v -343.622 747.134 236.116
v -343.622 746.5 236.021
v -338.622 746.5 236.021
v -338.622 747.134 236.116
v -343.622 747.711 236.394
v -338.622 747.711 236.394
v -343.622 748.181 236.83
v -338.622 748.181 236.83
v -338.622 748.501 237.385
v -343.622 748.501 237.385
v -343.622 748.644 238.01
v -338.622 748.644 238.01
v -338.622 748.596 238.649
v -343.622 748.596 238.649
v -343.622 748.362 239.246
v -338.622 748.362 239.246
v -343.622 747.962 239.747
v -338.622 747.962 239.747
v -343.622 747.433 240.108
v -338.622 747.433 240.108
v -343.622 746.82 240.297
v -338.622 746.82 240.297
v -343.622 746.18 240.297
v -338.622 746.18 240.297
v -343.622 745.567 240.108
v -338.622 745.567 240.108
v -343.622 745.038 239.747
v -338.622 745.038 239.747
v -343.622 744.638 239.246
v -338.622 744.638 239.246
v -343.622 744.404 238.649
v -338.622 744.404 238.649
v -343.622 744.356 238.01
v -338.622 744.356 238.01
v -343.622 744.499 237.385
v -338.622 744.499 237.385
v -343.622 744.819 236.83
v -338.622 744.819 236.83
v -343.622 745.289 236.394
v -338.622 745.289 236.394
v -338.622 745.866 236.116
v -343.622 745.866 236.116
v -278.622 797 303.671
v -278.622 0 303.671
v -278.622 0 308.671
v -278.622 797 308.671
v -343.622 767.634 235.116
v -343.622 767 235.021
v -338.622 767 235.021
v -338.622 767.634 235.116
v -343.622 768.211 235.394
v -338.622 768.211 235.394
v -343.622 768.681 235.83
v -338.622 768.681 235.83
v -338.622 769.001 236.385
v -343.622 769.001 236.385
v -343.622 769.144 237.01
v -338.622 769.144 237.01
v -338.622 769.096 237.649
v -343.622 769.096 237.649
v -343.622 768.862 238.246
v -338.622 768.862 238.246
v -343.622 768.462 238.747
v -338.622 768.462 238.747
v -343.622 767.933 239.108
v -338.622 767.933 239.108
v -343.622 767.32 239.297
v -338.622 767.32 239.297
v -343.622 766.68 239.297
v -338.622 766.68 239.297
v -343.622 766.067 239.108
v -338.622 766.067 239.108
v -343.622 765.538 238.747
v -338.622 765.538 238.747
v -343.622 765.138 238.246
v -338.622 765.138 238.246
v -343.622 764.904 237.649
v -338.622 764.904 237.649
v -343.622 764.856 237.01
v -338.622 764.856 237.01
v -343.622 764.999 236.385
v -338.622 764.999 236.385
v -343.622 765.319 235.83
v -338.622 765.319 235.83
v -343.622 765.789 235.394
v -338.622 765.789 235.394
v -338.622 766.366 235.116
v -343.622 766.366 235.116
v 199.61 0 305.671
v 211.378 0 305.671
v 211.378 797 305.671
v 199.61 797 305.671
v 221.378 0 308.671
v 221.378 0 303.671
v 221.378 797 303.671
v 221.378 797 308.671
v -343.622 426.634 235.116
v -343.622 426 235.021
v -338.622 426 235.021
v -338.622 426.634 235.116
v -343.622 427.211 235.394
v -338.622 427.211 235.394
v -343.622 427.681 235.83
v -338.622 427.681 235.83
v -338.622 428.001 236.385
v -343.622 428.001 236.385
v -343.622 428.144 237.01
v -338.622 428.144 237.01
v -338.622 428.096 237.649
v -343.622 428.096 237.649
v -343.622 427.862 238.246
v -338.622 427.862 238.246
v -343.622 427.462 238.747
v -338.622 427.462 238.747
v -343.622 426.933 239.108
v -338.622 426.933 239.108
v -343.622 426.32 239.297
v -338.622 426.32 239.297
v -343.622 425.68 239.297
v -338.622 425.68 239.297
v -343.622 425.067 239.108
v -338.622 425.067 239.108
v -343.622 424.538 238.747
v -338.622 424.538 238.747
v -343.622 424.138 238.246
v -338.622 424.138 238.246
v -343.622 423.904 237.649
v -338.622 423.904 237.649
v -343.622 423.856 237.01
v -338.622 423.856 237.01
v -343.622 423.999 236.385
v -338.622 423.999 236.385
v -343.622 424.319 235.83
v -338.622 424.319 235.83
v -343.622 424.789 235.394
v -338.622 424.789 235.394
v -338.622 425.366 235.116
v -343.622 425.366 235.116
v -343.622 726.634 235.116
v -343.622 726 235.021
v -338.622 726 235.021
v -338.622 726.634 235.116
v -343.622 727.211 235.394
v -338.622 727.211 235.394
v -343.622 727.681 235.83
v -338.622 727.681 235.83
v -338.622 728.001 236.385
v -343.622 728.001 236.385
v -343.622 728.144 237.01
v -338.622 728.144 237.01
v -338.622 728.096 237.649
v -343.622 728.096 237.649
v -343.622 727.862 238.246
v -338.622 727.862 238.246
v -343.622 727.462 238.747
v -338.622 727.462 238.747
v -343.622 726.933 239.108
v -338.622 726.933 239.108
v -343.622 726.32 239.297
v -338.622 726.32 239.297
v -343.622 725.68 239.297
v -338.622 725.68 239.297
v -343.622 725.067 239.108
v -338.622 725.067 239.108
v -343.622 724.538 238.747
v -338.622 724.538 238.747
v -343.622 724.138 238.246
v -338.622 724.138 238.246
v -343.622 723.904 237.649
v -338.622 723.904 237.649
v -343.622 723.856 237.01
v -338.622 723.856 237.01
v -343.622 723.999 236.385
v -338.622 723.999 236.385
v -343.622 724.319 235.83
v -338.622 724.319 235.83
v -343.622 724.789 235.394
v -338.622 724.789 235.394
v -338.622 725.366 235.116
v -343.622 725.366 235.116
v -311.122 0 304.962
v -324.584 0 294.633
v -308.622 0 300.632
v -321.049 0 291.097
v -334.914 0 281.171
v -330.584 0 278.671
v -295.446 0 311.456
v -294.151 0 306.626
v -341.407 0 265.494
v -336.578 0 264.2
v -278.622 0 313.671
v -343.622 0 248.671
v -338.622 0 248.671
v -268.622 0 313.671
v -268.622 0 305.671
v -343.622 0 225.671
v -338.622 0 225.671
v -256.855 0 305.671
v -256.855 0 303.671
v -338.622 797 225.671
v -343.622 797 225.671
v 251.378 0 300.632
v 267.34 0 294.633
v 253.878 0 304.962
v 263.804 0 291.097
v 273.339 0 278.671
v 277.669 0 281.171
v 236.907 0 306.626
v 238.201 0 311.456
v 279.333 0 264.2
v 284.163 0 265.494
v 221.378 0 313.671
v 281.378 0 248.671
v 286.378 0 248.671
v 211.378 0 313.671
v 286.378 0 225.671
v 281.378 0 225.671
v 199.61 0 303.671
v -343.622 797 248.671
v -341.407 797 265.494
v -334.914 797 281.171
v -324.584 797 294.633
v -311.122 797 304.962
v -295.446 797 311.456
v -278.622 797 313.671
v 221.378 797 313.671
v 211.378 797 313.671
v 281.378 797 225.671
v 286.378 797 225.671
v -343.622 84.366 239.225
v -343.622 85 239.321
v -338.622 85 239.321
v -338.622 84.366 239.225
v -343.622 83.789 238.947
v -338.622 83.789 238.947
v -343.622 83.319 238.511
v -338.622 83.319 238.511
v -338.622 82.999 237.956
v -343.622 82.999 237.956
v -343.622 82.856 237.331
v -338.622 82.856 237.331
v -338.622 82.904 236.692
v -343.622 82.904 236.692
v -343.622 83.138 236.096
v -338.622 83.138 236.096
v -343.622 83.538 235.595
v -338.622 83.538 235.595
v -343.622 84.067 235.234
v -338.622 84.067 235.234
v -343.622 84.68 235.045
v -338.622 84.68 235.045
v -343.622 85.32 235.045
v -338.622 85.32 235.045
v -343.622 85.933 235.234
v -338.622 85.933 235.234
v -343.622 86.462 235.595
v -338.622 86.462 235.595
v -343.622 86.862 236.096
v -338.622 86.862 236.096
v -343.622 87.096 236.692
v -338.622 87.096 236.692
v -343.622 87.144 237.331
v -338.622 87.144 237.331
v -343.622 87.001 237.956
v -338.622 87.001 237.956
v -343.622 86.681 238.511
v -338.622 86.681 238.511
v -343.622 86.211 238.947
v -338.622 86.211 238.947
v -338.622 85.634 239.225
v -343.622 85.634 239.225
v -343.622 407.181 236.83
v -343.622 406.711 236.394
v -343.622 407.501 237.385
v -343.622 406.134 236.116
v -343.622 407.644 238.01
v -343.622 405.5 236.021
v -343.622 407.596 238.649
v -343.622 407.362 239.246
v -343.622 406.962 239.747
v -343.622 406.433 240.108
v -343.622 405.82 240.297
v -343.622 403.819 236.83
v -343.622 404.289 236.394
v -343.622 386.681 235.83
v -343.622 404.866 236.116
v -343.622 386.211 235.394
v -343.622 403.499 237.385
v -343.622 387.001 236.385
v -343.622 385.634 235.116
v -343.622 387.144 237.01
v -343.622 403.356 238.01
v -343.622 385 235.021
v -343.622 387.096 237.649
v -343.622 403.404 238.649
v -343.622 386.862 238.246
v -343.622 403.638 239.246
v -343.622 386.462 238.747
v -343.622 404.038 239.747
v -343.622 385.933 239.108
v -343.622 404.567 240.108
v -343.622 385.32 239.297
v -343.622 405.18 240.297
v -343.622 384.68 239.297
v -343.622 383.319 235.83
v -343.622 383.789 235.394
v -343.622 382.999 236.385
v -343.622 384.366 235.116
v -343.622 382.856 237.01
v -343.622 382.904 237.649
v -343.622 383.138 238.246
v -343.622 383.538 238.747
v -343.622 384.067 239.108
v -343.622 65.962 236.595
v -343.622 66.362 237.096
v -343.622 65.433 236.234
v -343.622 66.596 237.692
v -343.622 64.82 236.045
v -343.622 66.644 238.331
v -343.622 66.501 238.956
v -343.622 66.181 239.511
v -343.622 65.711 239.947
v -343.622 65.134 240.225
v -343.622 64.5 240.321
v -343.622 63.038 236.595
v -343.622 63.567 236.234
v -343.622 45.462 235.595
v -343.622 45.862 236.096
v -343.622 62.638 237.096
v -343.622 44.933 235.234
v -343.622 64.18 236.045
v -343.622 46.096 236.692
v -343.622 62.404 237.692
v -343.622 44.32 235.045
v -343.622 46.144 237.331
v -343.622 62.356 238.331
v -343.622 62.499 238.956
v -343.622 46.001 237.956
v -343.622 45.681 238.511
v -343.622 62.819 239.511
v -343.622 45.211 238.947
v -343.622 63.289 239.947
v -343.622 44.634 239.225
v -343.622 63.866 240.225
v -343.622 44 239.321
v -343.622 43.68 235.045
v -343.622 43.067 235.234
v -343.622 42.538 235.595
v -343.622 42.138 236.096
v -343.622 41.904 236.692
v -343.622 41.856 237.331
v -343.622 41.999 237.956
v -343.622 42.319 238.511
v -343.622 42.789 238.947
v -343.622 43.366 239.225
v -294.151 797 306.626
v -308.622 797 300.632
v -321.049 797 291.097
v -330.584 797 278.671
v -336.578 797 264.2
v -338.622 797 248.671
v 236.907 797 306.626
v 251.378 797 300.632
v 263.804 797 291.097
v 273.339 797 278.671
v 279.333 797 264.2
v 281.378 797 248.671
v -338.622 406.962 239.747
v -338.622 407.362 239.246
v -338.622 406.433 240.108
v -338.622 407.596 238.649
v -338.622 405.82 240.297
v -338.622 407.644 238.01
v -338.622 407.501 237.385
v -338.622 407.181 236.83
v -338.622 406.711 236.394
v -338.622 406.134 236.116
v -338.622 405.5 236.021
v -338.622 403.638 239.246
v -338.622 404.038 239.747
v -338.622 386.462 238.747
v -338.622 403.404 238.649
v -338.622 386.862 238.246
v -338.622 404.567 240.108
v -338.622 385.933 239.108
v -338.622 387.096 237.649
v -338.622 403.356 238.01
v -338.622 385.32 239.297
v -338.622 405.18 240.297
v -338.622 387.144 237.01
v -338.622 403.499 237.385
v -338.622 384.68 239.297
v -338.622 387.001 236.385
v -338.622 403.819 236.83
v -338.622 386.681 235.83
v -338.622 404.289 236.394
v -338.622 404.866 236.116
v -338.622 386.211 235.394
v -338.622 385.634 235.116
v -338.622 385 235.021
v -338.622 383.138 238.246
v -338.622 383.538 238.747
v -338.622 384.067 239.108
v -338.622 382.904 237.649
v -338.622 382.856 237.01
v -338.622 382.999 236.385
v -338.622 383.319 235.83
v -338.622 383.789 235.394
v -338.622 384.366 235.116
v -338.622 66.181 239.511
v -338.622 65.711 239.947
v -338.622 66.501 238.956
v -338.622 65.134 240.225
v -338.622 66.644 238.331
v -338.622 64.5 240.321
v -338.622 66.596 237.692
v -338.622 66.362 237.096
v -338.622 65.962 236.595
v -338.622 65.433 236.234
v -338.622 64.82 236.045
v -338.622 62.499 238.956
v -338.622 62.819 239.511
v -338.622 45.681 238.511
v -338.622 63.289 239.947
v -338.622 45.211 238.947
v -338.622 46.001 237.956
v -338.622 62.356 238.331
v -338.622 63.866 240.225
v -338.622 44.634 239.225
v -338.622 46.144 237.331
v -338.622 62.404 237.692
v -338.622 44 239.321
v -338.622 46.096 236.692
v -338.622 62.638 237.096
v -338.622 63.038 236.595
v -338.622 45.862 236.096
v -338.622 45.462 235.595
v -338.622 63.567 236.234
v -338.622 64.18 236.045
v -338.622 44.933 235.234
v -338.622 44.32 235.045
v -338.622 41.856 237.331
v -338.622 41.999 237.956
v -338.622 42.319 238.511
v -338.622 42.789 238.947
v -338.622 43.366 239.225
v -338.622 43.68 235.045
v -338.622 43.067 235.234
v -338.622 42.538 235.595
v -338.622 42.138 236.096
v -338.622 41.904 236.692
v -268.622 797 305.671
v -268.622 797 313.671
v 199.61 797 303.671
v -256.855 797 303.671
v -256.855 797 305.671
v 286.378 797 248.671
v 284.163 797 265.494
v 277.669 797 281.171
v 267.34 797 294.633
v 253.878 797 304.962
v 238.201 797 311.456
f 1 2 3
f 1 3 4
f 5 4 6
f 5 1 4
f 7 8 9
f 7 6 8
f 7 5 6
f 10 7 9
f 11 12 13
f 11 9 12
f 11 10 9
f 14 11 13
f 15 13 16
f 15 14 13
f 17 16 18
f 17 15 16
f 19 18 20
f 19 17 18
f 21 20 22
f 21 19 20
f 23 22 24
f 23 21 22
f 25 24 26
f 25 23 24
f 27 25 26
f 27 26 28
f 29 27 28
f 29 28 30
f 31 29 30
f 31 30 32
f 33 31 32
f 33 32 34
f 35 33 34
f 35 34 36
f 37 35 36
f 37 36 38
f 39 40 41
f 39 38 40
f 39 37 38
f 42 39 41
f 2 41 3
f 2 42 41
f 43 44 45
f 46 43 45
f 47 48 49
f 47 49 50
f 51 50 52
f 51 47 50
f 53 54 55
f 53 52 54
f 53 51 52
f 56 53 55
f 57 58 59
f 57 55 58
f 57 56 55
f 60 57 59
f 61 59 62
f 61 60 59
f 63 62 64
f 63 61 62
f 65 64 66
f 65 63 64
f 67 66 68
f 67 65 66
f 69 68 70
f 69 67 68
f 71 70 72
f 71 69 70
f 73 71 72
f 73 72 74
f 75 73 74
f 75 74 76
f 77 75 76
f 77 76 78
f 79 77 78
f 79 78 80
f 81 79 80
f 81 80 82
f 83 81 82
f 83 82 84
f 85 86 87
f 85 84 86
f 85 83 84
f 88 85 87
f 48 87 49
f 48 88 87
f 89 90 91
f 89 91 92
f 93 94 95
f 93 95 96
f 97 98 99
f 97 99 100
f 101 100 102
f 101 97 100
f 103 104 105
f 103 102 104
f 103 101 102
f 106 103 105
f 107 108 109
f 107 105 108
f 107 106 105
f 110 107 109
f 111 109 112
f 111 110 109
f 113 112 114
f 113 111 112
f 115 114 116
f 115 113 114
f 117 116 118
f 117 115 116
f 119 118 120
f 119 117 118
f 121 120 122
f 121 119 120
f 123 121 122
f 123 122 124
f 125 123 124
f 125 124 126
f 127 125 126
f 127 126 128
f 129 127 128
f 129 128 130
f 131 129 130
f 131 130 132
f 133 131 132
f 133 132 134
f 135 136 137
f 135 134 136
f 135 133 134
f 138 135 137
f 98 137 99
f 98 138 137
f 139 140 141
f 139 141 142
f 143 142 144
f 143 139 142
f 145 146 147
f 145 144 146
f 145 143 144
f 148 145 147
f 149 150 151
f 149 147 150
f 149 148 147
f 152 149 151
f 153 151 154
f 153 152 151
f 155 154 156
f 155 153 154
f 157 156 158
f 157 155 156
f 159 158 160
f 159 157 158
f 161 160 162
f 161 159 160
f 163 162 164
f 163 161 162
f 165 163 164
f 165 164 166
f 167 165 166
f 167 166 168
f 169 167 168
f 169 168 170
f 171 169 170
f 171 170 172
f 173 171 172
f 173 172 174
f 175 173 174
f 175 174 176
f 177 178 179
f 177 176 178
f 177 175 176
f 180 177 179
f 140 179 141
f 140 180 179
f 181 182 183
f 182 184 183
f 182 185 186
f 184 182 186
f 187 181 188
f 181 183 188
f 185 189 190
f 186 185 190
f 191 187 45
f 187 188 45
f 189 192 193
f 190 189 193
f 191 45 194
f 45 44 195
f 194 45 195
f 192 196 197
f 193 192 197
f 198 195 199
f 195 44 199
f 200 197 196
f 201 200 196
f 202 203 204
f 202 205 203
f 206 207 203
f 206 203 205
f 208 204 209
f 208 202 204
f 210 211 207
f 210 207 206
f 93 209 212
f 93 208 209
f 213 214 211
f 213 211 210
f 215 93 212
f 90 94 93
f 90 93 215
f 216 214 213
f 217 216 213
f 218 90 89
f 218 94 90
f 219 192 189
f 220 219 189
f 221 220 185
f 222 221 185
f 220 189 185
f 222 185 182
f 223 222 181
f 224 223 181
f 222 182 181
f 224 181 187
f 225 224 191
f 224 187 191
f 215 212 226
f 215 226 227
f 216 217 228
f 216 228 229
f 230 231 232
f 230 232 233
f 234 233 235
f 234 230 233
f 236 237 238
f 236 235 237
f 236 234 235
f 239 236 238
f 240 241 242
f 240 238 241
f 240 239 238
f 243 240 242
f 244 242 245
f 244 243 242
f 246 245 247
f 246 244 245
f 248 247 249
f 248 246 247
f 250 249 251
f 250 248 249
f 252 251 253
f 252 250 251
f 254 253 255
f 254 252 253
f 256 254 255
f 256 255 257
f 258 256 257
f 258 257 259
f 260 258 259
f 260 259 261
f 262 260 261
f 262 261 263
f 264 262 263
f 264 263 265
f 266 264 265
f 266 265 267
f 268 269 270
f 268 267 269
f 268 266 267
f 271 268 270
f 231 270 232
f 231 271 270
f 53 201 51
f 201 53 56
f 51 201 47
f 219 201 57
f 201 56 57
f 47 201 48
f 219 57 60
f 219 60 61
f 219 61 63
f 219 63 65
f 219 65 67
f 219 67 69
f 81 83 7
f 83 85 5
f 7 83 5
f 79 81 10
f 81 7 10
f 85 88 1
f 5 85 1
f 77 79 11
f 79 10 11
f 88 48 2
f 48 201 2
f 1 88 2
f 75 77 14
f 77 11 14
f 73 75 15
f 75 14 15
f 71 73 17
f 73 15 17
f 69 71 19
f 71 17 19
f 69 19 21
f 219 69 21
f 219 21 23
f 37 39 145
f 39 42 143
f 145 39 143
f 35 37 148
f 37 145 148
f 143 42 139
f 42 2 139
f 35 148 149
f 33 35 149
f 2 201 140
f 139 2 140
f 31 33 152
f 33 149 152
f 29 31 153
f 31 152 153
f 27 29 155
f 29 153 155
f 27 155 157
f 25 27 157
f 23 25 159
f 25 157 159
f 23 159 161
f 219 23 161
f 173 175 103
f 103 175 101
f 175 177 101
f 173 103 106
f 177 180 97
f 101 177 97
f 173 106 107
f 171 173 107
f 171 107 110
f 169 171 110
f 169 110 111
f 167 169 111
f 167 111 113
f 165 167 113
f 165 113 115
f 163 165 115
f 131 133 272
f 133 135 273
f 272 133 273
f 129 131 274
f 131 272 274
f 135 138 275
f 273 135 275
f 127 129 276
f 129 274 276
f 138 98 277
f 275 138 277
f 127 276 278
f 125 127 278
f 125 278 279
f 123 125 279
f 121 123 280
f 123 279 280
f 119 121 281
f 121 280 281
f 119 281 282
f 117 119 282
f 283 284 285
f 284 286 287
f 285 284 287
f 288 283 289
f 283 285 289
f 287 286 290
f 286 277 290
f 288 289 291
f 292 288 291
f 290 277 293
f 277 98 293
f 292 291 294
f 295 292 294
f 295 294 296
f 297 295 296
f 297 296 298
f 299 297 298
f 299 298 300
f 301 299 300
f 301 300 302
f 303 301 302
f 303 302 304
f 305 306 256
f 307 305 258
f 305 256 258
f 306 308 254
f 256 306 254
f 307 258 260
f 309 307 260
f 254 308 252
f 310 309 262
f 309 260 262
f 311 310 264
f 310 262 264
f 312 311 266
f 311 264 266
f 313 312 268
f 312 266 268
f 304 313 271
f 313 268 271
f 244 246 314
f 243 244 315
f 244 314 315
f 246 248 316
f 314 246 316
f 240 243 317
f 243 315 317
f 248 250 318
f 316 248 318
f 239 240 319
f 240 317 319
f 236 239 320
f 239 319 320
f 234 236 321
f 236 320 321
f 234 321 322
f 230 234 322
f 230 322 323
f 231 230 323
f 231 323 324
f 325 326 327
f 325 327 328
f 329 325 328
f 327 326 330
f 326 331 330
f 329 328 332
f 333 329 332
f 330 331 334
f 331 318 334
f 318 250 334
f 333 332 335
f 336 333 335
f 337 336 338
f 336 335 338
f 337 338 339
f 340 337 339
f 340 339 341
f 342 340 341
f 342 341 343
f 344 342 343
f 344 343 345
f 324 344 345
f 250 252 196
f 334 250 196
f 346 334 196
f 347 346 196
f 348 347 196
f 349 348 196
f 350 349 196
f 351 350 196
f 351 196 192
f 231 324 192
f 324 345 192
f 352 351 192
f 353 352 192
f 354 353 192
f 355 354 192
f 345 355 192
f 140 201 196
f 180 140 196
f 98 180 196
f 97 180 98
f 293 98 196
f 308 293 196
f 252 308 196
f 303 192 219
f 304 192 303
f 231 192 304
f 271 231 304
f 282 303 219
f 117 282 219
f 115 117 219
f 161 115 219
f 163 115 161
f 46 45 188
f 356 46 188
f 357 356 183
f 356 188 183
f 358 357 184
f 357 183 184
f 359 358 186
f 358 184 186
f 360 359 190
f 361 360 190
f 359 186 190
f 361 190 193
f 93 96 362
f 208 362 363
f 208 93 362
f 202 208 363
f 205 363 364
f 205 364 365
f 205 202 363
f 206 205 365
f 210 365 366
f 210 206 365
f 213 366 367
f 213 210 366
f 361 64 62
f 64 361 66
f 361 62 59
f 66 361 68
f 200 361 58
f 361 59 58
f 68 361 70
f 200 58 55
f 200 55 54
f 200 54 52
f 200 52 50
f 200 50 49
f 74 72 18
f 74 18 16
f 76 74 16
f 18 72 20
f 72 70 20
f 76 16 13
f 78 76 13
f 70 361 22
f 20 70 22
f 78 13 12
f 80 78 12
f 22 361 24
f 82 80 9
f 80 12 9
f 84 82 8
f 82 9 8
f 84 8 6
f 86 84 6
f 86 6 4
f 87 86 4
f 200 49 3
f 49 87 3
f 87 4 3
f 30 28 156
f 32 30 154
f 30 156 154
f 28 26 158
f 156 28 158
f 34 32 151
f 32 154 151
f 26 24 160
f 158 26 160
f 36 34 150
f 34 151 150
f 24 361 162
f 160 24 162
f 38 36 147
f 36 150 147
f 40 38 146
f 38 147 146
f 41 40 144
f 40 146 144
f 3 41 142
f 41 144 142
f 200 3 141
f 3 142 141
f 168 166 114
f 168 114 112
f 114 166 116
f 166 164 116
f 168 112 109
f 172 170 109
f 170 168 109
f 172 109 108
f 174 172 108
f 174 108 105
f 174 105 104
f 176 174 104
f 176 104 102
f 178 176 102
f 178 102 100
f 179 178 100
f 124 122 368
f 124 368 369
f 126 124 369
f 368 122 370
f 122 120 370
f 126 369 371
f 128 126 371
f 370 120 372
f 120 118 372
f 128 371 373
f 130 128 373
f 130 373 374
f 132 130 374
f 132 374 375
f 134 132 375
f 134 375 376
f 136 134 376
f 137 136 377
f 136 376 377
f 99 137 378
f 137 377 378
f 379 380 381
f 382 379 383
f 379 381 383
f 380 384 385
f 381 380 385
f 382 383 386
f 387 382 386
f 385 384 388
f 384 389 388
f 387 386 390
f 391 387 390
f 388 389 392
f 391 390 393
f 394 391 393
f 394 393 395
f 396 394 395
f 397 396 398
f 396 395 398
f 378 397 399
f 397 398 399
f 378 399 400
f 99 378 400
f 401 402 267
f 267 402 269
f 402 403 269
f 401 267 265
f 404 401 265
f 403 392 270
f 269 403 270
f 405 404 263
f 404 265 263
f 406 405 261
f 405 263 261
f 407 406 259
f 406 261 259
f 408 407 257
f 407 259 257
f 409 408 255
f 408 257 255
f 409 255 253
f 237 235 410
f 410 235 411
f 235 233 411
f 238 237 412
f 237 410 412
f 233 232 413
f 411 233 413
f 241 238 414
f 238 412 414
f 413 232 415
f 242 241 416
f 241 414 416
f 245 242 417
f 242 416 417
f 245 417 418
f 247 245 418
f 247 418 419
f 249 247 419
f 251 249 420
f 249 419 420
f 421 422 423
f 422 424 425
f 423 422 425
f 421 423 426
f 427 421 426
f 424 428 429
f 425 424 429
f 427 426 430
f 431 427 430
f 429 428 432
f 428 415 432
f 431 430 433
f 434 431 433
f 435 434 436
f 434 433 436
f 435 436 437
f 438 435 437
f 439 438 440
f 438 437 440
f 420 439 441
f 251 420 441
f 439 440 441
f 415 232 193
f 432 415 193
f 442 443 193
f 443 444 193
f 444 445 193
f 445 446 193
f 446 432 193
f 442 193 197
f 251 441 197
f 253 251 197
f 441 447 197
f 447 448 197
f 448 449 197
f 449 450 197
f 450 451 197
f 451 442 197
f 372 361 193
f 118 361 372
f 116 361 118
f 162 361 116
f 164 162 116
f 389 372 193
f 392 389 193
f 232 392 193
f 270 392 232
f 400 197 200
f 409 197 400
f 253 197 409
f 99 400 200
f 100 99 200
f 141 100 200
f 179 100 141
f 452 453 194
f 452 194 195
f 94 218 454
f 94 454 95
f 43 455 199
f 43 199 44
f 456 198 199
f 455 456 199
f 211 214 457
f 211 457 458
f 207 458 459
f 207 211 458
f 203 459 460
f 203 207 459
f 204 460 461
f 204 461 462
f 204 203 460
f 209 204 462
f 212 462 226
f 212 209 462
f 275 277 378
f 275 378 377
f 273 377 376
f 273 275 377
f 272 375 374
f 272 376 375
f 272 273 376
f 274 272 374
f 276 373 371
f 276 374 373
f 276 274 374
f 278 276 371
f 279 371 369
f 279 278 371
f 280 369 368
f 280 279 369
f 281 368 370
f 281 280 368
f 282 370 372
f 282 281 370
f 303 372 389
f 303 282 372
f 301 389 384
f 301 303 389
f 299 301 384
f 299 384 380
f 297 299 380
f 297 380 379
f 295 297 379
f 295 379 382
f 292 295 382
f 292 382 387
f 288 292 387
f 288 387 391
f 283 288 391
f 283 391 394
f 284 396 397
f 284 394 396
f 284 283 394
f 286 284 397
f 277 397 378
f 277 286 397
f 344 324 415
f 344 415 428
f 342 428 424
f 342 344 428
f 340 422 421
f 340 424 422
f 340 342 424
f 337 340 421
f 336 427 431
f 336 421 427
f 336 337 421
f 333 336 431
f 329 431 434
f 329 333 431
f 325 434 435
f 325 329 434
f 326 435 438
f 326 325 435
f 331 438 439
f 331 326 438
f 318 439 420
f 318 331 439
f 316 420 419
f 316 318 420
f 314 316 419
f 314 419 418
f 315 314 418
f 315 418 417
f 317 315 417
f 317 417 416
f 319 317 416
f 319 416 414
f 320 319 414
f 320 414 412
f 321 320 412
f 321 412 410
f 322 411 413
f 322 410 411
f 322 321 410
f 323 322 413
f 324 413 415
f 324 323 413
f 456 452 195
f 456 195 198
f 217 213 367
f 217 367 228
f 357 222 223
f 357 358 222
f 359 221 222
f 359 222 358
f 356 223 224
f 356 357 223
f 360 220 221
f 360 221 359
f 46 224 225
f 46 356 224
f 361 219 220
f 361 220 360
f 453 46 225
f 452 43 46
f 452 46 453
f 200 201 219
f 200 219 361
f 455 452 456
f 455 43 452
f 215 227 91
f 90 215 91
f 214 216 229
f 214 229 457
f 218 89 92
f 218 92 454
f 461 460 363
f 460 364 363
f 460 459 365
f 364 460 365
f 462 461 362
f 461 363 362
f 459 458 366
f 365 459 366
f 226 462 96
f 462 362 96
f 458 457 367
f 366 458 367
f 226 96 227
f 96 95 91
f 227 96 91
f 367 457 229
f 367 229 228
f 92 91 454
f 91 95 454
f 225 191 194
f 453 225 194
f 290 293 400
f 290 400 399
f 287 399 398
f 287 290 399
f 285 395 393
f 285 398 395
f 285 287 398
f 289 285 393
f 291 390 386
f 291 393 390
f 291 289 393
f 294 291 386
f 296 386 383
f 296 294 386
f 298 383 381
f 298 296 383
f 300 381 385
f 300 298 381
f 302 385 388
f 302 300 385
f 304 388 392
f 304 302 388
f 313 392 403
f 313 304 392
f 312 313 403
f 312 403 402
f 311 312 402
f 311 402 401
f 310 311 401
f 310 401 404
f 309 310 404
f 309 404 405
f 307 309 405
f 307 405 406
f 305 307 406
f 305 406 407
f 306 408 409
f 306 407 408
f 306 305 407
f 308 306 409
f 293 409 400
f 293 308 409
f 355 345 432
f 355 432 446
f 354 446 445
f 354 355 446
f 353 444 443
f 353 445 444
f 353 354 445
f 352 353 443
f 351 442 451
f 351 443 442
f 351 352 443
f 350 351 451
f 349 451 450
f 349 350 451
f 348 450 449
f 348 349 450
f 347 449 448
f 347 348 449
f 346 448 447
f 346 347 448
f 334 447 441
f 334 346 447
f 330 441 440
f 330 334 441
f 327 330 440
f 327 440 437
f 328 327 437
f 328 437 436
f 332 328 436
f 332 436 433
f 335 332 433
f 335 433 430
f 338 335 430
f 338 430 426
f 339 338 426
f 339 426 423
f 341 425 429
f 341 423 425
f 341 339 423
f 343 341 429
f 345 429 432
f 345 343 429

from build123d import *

# Parameters (mm, degrees)
EXTRUDE_1_DEPTH          = 797
EXTRUDE_1_2_DEPTH        = 797
CUT_EXTRUDE_1_DEPTH      = 20
CUT_EXTRUDE_1_DEPTH_BACK = 1061.29395051
SKETCH_3_R               = 2.15


with BuildPart() as part:
    # 草图2 → 凸台-拉伸1 (new body)
    with BuildSketch(Plane(origin=(0, 0, 0), x_dir=(1, 0, 0), z_dir=(0, 1, 0))):
        with BuildLine():
            Line((-278.622282089, -303.670625798), (-278.622282089, -308.670625798))
            ThreePointArc((-278.622282089, -308.670625798), (-321.04868896, -291.097032669), (-338.622282089, -248.670625798))
            Line((-338.622282089, -248.670625798), (-338.622282089, -225.670625798))
            Line((-338.622282089, -225.670625798), (-343.622282089, -225.670625798))
            Line((-343.622282089, -225.670625798), (-343.622282089, -248.670625798))
            ThreePointArc((-343.622282089, -248.670625798), (-324.584222866, -294.632566575), (-278.622282089, -313.670625798))
            Line((-278.622282089, -313.670625798), (-268.622282089, -313.670625798))
            Line((-268.622282089, -313.670625798), (-268.622282089, -308.670625798))
            Line((-268.622282089, -308.670625798), (-268.622282089, -305.670625798))
            Line((-268.622282089, -305.670625798), (-256.854692605, -305.670625798))
            Line((-256.854692605, -305.670625798), (-256.854692605, -303.670625798))
            Line((-256.854692605, -303.670625798), (-278.622282089, -303.670625798))
        make_face()
    extrude(amount=EXTRUDE_1_DEPTH)

    # 草图3 → 切除-拉伸1 (cut, two sides: drawn at the far end of the back side and taken through both)
    with BuildSketch(Plane(origin=(-338.622282089, 0, 0), x_dir=(0, 0, -1), z_dir=(1, 0, 0)).offset(-CUT_EXTRUDE_1_DEPTH_BACK)):
        with Locations((-237.170625798, 767)):
            Circle(SKETCH_3_R)
        with Locations((-238.170625798, 746.5)):
            Circle(SKETCH_3_R)
        with Locations((-237.170625798, 726)):
            Circle(SKETCH_3_R)
        with Locations(Location((-237.170625798, 85, 0), (0, 0, 180))):
            Circle(SKETCH_3_R)
        with Locations(Location((-238.170625798, 64.5, 0), (0, 0, 180))):
            Circle(SKETCH_3_R)
        with Locations(Location((-237.170625798, 44, 0), (0, 0, 180))):
            Circle(SKETCH_3_R)
        with Locations((-237.170625798, 426)):
            Circle(SKETCH_3_R)
        with Locations((-238.170625798, 405.5)):
            Circle(SKETCH_3_R)
        with Locations((-237.170625798, 385)):
            Circle(SKETCH_3_R)
    extrude(amount=CUT_EXTRUDE_1_DEPTH + CUT_EXTRUDE_1_DEPTH_BACK, mode=Mode.SUBTRACT)


with BuildPart() as body_2:
    # 草图2 → Extrude 1 2 (new body)
    with BuildSketch(Plane(origin=(0, 0, 0), x_dir=(1, 0, 0), z_dir=(0, 1, 0))):
        with BuildLine():
            Line((281.377717911, -248.670625798), (281.377717911, -225.670625798))
            Line((281.377717911, -225.670625798), (286.377717911, -225.670625798))
            Line((286.377717911, -225.670625798), (286.377717911, -248.670625798))
            ThreePointArc((286.377717911, -248.670625798), (267.339658688, -294.632566575), (221.377717911, -313.670625798))
            Line((221.377717911, -313.670625798), (211.377717911, -313.670625798))
            Line((211.377717911, -313.670625798), (211.377717911, -308.670625798))
            Line((211.377717911, -308.670625798), (211.377717911, -305.670625798))
            Line((211.377717911, -305.670625798), (199.610128426, -305.670625798))
            Line((199.610128426, -305.670625798), (199.610128426, -303.670625798))
            Line((199.610128426, -303.670625798), (221.377717911, -303.670625798))
            Line((221.377717911, -303.670625798), (221.377717911, -308.670625798))
            ThreePointArc((221.377717911, -308.670625798), (263.804124782, -291.097032669), (281.377717911, -248.670625798))
        make_face()
    extrude(amount=EXTRUDE_1_2_DEPTH)


solid = Compound([part.part, body_2.part])
